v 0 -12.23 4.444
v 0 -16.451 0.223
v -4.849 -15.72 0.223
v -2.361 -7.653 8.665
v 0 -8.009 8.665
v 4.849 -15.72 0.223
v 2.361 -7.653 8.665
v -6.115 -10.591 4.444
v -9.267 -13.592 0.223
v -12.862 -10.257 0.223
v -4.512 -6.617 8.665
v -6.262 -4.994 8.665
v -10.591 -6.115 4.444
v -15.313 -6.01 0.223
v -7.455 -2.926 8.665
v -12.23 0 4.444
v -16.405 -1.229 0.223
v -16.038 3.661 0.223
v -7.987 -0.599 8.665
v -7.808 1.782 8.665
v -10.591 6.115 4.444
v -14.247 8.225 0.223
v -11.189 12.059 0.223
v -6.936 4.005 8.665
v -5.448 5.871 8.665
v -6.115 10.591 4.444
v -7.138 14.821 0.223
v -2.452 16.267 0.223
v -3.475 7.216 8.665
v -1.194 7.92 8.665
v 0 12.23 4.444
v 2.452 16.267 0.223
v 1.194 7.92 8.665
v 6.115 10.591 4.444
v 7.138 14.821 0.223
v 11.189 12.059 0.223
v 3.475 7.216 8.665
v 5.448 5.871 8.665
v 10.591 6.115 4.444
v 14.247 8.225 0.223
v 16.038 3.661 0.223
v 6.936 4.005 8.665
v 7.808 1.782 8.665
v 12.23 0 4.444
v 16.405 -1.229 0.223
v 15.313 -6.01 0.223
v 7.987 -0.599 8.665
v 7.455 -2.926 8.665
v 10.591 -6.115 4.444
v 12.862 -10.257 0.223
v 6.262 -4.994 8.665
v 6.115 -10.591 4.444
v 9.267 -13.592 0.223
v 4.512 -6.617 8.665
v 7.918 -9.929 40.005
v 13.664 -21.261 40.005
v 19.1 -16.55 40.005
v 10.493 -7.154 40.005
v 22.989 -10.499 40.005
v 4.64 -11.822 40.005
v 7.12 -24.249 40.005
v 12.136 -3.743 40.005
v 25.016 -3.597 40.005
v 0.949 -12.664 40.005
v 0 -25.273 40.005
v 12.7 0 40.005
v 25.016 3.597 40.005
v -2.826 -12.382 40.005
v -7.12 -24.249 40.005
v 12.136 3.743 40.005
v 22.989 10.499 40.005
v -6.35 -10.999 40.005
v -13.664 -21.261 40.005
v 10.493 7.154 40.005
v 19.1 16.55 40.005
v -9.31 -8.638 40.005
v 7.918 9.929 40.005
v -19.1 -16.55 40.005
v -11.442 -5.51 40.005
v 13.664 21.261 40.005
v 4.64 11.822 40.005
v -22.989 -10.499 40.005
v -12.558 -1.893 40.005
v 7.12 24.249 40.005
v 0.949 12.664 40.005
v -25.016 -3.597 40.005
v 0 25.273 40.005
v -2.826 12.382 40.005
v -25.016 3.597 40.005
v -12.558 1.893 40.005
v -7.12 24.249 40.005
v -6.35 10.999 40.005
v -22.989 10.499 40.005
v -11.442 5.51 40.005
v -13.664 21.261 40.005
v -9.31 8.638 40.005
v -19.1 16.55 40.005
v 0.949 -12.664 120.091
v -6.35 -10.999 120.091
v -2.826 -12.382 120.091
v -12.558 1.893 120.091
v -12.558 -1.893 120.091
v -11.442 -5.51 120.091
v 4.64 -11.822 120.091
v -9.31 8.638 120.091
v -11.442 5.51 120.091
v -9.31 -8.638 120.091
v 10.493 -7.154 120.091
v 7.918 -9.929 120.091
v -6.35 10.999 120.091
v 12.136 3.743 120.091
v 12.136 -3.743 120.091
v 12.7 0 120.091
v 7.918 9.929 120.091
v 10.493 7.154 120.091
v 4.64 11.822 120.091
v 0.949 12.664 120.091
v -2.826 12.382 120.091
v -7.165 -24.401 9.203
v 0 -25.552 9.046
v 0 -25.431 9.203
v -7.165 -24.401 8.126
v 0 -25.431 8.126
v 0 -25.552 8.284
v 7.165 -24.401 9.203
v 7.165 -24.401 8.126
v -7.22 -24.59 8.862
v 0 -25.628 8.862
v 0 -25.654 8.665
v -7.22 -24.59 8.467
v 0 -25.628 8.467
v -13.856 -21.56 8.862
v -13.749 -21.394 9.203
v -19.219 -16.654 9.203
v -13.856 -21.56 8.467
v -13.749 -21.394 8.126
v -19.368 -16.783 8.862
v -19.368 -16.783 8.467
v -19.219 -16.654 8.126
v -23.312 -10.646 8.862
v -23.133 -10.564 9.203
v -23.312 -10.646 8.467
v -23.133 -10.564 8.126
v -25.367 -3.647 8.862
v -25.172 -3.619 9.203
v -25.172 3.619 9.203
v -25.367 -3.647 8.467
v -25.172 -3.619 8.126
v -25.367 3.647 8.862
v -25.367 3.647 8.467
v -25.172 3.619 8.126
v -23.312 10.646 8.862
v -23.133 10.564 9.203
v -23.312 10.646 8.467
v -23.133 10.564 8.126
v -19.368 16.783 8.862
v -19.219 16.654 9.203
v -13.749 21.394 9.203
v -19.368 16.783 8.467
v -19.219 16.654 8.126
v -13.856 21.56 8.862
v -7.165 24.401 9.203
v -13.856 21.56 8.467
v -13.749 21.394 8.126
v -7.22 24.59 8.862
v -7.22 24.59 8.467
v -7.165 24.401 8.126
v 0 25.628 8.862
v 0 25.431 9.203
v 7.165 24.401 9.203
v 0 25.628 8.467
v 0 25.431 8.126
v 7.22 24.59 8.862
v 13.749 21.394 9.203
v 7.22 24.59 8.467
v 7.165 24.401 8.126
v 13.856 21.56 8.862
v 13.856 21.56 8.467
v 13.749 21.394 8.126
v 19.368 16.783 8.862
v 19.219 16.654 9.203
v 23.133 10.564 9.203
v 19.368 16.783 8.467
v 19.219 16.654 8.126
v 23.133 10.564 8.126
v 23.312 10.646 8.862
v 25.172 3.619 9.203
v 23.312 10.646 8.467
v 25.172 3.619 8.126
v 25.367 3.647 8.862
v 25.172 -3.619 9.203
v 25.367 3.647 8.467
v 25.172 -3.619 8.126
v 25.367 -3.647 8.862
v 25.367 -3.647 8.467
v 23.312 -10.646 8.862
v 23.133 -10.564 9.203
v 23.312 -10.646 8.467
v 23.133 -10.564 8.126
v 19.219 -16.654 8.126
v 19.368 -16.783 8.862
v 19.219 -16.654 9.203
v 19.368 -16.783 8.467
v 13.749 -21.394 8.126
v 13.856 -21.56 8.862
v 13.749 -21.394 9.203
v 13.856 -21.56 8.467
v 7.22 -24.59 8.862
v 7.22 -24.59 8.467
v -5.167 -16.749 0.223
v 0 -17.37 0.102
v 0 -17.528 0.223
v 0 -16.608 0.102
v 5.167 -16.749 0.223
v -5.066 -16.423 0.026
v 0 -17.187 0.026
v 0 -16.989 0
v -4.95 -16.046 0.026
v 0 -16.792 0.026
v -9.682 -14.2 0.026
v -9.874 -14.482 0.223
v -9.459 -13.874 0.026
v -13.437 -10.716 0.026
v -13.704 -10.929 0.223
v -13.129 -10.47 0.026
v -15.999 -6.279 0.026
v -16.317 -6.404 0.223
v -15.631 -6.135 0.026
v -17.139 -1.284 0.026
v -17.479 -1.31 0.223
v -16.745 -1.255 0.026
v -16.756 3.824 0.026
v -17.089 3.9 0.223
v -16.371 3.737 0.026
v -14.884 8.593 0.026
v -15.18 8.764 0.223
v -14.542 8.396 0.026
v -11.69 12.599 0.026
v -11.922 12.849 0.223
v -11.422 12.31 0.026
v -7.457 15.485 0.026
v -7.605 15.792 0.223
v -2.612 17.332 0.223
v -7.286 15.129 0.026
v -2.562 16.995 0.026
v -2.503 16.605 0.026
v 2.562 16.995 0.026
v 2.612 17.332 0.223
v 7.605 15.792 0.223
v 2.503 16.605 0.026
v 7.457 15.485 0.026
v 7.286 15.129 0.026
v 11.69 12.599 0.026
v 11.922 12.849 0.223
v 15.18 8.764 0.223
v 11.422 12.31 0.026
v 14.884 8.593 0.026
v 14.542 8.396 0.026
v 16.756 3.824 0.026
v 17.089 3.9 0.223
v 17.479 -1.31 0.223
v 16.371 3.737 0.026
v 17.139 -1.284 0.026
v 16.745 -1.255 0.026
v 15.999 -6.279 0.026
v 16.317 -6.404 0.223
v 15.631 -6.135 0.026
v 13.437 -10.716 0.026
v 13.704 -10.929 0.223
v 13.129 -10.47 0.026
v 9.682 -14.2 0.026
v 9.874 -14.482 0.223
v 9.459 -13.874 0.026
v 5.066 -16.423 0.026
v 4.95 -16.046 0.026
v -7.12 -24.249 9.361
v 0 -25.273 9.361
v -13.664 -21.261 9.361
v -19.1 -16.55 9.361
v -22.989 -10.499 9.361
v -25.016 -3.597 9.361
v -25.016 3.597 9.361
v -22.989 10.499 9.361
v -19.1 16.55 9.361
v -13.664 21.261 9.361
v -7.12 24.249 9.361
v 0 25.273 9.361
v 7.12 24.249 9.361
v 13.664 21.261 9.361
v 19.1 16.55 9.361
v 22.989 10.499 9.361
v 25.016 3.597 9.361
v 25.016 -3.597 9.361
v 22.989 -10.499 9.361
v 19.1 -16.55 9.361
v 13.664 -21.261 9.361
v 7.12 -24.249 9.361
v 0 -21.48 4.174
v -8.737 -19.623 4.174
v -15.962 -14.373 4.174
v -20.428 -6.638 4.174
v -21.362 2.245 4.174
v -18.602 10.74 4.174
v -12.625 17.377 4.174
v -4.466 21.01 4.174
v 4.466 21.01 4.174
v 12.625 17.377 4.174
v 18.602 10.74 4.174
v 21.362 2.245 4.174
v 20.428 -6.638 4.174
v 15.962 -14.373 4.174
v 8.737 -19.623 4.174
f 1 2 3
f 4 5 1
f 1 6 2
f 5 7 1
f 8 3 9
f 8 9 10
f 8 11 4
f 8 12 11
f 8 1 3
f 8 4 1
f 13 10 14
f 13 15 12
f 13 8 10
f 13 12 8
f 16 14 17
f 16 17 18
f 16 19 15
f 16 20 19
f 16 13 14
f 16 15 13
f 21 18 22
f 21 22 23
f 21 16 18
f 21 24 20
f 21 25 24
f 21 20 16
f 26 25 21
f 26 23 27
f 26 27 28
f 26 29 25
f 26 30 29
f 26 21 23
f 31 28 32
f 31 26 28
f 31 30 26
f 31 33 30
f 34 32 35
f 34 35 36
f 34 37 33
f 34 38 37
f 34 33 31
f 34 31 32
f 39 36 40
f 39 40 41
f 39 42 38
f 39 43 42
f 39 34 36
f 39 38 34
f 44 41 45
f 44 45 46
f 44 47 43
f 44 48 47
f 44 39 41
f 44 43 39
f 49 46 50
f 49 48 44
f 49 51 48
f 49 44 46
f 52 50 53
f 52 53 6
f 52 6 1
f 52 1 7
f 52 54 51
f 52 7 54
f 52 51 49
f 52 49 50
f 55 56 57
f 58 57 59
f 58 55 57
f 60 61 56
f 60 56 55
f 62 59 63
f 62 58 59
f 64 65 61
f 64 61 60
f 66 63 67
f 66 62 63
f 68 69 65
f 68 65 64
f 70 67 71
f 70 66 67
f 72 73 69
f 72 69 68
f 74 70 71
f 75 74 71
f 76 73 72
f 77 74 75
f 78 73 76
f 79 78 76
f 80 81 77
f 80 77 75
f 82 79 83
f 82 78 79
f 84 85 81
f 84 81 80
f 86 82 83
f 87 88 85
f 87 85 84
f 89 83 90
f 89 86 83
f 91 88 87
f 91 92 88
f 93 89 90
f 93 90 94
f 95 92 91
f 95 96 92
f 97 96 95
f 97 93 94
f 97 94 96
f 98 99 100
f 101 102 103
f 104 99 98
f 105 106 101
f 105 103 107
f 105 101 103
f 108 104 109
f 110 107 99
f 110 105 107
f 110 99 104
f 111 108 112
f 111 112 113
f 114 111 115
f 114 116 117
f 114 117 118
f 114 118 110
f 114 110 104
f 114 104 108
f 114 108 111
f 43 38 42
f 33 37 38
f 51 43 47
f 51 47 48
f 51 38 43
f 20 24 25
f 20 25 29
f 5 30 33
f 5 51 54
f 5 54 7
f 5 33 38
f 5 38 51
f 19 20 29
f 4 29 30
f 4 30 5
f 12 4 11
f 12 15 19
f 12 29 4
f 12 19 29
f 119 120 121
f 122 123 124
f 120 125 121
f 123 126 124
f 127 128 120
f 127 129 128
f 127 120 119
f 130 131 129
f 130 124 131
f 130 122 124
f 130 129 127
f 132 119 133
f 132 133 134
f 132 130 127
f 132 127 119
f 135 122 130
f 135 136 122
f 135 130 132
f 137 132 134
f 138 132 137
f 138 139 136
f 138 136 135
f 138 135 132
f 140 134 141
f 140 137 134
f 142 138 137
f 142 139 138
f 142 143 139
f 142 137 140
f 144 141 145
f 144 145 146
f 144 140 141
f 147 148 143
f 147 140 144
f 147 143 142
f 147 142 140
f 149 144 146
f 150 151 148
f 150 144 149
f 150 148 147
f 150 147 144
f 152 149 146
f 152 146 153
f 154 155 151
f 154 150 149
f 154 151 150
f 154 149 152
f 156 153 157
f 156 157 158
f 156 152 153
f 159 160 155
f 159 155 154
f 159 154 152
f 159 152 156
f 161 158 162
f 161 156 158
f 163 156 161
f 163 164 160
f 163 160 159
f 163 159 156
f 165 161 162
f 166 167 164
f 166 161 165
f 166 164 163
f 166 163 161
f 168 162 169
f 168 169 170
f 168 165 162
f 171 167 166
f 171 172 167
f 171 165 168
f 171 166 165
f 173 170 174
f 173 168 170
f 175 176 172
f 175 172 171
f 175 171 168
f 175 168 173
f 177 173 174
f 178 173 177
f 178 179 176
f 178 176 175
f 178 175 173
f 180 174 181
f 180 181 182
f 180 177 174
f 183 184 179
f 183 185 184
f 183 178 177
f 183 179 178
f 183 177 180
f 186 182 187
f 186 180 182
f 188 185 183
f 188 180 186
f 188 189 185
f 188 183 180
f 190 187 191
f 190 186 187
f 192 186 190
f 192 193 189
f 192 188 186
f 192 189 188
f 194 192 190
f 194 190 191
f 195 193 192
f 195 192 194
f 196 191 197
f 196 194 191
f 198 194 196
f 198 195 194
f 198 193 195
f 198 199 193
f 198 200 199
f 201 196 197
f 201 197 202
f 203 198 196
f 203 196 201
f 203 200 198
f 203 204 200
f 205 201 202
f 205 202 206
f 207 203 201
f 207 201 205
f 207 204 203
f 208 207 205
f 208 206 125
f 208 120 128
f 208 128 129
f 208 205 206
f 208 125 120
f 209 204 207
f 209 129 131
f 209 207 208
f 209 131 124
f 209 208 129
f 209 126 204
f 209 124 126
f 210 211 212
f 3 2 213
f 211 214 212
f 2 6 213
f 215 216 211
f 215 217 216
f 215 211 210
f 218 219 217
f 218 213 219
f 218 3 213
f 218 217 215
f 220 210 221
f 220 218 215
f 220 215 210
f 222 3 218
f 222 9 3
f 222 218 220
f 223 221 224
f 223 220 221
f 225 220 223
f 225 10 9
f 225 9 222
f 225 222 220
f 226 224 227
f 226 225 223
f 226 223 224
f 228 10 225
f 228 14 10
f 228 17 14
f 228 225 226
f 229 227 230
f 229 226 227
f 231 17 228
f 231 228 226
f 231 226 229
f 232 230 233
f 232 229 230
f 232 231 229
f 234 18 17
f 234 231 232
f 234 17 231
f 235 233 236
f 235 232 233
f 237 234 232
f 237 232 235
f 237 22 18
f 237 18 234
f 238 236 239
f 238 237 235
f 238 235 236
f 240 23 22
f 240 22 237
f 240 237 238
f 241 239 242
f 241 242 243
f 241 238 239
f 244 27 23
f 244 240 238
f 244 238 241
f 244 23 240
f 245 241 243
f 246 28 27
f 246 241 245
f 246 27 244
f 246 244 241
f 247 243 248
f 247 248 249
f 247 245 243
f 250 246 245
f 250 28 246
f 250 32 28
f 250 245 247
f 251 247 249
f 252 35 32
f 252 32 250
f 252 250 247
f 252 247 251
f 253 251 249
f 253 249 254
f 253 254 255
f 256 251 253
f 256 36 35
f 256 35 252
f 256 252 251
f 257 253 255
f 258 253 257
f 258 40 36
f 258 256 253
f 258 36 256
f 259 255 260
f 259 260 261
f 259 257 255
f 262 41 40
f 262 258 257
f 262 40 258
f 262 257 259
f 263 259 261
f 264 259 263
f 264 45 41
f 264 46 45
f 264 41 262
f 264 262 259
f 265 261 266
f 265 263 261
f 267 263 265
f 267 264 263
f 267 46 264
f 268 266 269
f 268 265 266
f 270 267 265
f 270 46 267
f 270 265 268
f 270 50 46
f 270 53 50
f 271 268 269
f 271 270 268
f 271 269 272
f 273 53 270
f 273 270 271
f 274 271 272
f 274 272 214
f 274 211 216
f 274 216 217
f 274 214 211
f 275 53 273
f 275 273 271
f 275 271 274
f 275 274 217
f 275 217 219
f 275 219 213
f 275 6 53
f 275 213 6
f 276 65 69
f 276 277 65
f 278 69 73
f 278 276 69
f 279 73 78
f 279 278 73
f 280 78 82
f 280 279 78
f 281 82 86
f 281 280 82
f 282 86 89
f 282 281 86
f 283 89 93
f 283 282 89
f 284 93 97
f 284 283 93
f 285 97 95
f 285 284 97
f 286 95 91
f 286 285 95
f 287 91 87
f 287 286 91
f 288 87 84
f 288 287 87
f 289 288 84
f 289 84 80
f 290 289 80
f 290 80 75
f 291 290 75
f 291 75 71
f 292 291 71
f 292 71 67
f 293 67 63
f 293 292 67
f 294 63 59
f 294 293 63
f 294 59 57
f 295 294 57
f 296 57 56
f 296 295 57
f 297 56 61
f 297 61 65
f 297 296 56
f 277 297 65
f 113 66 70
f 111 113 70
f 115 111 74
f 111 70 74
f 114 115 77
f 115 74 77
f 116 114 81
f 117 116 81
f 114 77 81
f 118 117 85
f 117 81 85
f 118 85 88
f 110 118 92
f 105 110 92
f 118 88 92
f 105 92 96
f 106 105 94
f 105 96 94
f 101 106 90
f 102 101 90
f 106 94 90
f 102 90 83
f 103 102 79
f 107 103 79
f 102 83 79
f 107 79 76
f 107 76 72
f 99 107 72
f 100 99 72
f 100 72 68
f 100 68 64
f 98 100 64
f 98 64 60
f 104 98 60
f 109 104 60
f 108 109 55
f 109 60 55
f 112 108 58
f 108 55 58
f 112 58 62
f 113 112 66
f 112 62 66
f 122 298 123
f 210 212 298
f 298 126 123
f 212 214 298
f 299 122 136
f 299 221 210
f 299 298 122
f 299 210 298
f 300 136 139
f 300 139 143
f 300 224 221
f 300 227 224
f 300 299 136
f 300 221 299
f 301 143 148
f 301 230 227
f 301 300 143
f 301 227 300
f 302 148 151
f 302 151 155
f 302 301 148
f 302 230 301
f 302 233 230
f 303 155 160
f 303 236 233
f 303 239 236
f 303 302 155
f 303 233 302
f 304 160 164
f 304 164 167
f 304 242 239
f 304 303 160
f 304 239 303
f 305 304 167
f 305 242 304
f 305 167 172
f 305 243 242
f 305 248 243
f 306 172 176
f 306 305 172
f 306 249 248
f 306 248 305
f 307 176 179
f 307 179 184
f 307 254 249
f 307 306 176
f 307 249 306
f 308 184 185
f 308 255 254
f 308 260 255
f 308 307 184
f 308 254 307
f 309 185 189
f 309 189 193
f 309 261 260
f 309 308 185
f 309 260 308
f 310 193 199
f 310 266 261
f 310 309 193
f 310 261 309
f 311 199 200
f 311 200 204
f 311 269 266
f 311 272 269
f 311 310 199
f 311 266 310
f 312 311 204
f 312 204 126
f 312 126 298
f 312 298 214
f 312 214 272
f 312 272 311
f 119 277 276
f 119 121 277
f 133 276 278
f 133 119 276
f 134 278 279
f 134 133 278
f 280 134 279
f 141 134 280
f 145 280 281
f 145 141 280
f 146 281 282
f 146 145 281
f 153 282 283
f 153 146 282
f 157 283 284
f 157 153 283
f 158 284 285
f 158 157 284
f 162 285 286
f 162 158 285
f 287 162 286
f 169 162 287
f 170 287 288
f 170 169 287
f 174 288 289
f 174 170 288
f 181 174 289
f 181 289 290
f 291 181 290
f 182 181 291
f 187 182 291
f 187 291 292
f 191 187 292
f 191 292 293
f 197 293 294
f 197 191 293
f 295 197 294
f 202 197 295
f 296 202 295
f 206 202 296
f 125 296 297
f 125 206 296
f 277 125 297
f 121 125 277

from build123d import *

# Parameters (mm, degrees)
F2_R     = 12.7
F3_DEPTH = 80.0862


with BuildPart() as f1:
    # F0 (on Right) → F1 (revolve)
    with BuildSketch(Plane.YZ):
        with BuildLine():
            Line((0, 40.005), (-25.273, 40.005))
            Line((-25.273, 40.005), (-25.273, 9.361256))
            Line((-25.273, 9.361256), (-25.430815, 9.203441))
            ThreePointArc((-25.430815, 9.203441), (-25.654, 8.664625), (-25.430815, 8.12581))
            Line((-25.430815, 8.12581), (-17.52819, 0.223185))
            ThreePointArc((-17.52819, 0.223185), (-16.989375, 0), (-16.450559, 0.223185))
            Line((-16.450559, 0.223185), (-8.009118, 8.664625))
            Line((-8.009118, 8.664625), (0, 8.664625))
            Line((0, 8.664625), (0, 40.005))
        make_face()
    revolve(axis=Axis((0, 0, 24.334813), (0, 0, -1)))

    # F2 (on face) → F3 (join)
    with BuildSketch(Plane.XY.offset(40.005)):
        Circle(F2_R)
    extrude(amount=F3_DEPTH)


solid = f1.part
